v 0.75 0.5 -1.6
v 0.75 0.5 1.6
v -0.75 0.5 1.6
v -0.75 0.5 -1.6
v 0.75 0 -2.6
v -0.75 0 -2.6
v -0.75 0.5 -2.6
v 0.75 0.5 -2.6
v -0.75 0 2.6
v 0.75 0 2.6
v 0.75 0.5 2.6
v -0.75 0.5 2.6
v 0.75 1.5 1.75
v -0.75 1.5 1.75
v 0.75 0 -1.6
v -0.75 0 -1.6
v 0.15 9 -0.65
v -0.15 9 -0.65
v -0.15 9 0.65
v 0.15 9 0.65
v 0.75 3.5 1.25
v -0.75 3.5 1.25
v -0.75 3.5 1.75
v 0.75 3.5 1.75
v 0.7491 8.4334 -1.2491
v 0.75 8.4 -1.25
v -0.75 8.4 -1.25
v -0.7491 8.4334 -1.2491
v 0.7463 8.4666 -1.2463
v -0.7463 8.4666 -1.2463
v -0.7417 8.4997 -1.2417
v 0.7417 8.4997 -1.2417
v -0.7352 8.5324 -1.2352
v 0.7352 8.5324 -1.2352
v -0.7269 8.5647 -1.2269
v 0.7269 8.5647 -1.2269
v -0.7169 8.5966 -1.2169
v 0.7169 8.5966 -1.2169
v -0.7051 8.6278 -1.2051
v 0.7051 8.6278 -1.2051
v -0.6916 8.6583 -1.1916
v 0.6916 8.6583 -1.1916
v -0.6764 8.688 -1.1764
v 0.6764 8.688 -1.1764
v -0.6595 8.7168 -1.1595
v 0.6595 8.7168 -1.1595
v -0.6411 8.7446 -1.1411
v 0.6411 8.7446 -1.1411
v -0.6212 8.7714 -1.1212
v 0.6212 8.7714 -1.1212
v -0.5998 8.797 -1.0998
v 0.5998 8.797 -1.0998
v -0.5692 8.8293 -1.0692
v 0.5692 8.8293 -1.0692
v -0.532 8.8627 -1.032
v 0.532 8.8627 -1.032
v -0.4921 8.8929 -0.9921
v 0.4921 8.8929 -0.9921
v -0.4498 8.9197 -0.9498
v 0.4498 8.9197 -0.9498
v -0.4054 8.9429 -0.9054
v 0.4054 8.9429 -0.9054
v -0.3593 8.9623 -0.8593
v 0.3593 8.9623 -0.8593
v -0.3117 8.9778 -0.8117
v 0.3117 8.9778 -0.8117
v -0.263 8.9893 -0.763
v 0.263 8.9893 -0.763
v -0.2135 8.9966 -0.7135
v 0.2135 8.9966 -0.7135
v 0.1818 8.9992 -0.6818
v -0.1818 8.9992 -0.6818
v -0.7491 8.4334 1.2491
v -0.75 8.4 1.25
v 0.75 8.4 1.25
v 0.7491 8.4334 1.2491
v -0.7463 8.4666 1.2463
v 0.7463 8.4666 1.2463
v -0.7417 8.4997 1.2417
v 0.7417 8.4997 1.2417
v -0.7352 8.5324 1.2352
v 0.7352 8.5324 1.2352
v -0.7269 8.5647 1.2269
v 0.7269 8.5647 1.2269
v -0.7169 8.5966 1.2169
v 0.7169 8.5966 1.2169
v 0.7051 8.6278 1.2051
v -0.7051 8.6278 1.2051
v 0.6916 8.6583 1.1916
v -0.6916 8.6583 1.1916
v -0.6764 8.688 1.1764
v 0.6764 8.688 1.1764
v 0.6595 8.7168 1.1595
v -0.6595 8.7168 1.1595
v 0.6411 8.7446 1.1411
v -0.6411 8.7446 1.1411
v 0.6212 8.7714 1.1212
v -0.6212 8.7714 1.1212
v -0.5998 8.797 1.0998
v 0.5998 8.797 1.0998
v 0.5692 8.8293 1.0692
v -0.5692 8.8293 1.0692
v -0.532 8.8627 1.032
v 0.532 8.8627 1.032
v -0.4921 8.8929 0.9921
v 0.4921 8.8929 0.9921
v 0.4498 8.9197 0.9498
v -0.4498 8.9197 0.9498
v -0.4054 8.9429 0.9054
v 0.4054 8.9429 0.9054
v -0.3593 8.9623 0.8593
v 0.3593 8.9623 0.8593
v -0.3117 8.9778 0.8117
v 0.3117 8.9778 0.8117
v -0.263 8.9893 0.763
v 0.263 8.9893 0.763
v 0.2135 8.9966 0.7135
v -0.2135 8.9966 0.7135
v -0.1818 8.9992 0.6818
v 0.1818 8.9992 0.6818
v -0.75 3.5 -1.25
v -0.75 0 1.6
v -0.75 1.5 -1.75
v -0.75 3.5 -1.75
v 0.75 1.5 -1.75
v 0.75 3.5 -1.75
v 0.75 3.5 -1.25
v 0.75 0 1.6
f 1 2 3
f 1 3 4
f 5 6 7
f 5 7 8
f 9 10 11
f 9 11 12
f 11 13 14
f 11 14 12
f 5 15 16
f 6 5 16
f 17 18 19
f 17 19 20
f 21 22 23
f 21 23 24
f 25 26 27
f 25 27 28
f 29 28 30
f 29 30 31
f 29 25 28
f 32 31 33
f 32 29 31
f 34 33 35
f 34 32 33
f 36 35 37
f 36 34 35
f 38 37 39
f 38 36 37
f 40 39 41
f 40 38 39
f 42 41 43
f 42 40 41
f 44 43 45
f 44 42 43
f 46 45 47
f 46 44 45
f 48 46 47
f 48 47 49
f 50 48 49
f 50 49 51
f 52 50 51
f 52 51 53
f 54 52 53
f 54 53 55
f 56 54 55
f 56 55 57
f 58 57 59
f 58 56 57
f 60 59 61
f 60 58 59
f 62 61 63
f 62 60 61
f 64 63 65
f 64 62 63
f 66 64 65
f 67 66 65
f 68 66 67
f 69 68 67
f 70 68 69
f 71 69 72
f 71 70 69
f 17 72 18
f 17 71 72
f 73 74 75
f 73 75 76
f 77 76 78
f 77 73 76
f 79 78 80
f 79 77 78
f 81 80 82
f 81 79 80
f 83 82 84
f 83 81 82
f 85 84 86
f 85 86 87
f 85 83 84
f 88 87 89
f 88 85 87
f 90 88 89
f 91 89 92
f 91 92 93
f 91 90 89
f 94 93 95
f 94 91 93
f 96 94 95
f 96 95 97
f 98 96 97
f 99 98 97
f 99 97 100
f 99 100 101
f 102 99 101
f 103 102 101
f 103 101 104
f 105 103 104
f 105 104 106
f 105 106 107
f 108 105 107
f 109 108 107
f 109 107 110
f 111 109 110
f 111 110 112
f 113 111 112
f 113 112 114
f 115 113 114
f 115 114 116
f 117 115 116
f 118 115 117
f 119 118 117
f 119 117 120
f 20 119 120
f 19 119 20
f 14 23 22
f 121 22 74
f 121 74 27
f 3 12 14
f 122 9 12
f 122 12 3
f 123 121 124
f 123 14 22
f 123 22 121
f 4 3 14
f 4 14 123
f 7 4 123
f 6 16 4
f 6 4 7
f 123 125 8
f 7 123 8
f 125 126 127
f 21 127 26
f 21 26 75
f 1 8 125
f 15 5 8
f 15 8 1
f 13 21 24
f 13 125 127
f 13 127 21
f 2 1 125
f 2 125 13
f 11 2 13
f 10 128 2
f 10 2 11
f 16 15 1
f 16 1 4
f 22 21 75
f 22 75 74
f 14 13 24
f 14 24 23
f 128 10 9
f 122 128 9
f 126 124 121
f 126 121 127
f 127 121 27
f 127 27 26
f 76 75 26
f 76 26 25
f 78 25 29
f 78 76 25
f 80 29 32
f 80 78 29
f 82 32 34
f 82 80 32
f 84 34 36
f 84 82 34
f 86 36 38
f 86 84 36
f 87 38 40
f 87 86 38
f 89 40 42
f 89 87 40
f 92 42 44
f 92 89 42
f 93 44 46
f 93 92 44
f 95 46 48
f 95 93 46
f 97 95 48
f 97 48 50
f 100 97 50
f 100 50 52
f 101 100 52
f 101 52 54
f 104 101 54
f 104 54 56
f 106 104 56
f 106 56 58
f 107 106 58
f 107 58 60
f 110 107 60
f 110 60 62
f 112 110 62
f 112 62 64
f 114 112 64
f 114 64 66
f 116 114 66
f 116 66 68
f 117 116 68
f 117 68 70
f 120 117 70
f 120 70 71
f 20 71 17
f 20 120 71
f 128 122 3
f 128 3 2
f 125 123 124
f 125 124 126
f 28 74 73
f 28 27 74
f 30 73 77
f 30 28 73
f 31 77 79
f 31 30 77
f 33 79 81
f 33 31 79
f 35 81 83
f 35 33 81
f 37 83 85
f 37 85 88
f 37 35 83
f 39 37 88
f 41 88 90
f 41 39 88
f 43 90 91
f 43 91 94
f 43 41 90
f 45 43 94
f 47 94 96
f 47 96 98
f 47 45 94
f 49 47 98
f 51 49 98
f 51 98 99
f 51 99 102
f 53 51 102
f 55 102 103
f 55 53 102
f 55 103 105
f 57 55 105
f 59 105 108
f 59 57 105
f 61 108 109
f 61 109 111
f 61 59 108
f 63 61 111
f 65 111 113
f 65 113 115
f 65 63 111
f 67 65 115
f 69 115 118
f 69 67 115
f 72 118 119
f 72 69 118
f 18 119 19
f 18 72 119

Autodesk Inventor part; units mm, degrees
ref_plane "YZ Plane" through (0, 0, 0) normal (1, 0, 0) x (0, 1, 0)
ref_plane "XZ Plane" through (0, 0, 0) normal (0, 1, 0) x (-1, 0, 0)
ref_plane "XY Plane" through (0, 0, 0) normal (0, 0, 1) x (1, 0, 0)
sketch "Sketch1" plane through (0, 0, 0) normal (0, 1, 0) x (-1, 0, 0)
  line L0 (-0.75, -1.6) -> (0.75, -1.6)
  line L1 (0.75, -1.6) -> (0.75, 1.6)
  line L2 (0.75, 1.6) -> (-0.75, 1.6)
  line L3 (-0.75, 1.6) -> (-0.75, -1.6)
  line L4 (-0.75, -1.6) -> (0.75, 1.6) construction
  line L5 (0.75, -1.6) -> (-0.75, 1.6) construction
  line L6 (0.75, 1.6) -> (-0.75, 1.6)
  line L7 (-0.75, 1.6) -> (-0.75, 2.6)
  line L8 (-0.75, 2.6) -> (0.75, 2.6)
  line L9 (0.75, 2.6) -> (0.75, 1.6)
  line L10 (-0.75, -1.6) -> (0.75, -1.6)
  line L11 (0.75, -1.6) -> (0.75, -2.6)
  line L12 (0.75, -2.6) -> (-0.75, -2.6)
  line L13 (-0.75, -2.6) -> (-0.75, -1.6)
  point P0 (0, 0)
  point P1 (0.75, -1.6)
  dimension "d0" = 3.2
  dimension "d1" = 1.5
  dimension "d2" = 1
  dimension "d3" = 1
extrude "Extrusion1" add sketch "Sketch1" along normal blind 0.5 contours L0 L11 L12 L13 | L7 L8 L9 L2
sketch "Sketch2" plane through (0.75, 0, 2.6) normal (1, 0, 0) x (0, 0, -1)
  line L0 (0, 0.5) -> (1, 0.5) projected
  line L1 (0.85, 0.5) -> (4.35, 0.5)
  line L2 (4.35, 0.5) -> (4.35, 1.5)
  line L3 (4.35, 1.5) -> (0.85, 1.5)
  line L4 (0.85, 1.5) -> (0.85, 0.5)
  line L5 (0.85, 1.5) -> (0, 0.5)
  line L6 (5.2, 0) -> (5.2, 0.5) projected
  line L7 (4.35, 1.5) -> (5.2, 0.5)
  line L8 (0, 0) -> (1, 0) construction
  line L9 (0, 0) -> (5.2, 0) construction
  line L10 (2.6, 0) -> (2.6, 2.5684) construction
  line L11 (0, 0.5) -> (5.2, 0.5)
  point P0 (2.6, 0.5)
  dimension "d10" = 3.5
  dimension "d19" = 1
extrude "Extrusion3" add sketch "Sketch2" against normal blind 1.5
sketch "Sketch5" plane through (0.75, 1.5, 1.75) normal (0, 1, 0) x (1, 0, 0)
  line L0 (-1.5, 0) -> (-1.5, 3.5) projected
  line L1 (0, 3.5) -> (0, 0) projected
  line L2 (-1.5, 3.5) -> (0, 3.5)
  line L3 (0, 3.5) -> (0, 0)
  line L4 (0, 0) -> (-1.5, 0)
  line L5 (-1.5, 0) -> (-1.5, 3.5)
  point P0 (-0.75, 1.75)
  point P1 (0, 3.5)
  point P2 (-1.5, 0)
extrude "Extrusion5" add sketch "Sketch5" along normal blind 2
sketch "Sketch6" plane through (0.75, 3.5, 1.75) normal (0, 1, 0) x (1, 0, 0)
  line L0 (-1.5, 3) -> (0, 3)
  line L1 (0, 3) -> (0, 0.5)
  line L2 (0, 0.5) -> (-1.5, 0.5)
  line L3 (-1.5, 0.5) -> (-1.5, 3)
  line L4 (0, 0) -> (0, 3.5) construction
  line L5 (0, 0) -> (0, 0.5) construction
  line L6 (-0.75, 3) -> (-0.75, 3.5) construction
  line L7 (0, 3.5) -> (-1.5, 3.5) construction
  line L8 (-0.75, 0.5) -> (-0.75, 0) construction
  point P0 (-0.75, 1.75)
  point P1 (-1.5, 1.75)
  point P2 (0, 1.75)
  dimension "d20" = 2.5
extrude "Extrusion6" add sketch "Sketch6" along normal blind 5.5
fillet "Fillet1" radius 0.6 4 edges at (0, 9, -1.25) (-0.75, 9, 0) (0, 9, 1.25) (0.75, 9, 0)
sketch "Sketch7" plane through (0, 0, 0) normal (0, -1, 0) x (1, 0, 0)
  line L0 (-0.75, 2.6) -> (0.75, 2.6) projected
  line L1 (-0.75, -2.6) -> (0.75, -2.6)
  line L2 (0.75, -2.6) -> (0.75, 2.6)
  line L3 (0.75, 2.6) -> (-0.75, 2.6)
  line L4 (-0.75, 2.6) -> (-0.75, -2.6)
  line L5 (-0.75, -2.6) -> (0.75, 2.6) construction
  line L6 (0.75, -2.6) -> (-0.75, 2.6) construction
  point P0 (0, 0)
sketch "Sketch8" plane through (0.75, 0.5, -2.6) normal (0, -1, 0) x (1, 0, 0)
  line L0 (-1.5, 5.2) -> (0, 5.2) projected
  line L1 (0, 4.35) -> (-1.5, 4.35) projected
  line L2 (0, 5.2) -> (-1.5, 5.2)
  line L3 (-1.5, 5.2) -> (-1.5, 4.35)
  line L4 (-1.5, 4.35) -> (0, 4.35)
  line L5 (0, 4.35) -> (0, 5.2)
  line L6 (0, 0) -> (-1.5, 0) projected
  line L7 (0, 0.85) -> (-1.5, 0.85) projected
  line L8 (0, 0) -> (-1.5, 0)
  line L9 (-1.5, 0) -> (-1.5, 0.85)
  line L10 (-1.5, 0.85) -> (0, 0.85)
  line L11 (0, 0.85) -> (0, 0)
  point P0 (-0.75, 2.6)
  point P1 (0, 0.85)
sketch "Sketch4" plane through (0.75, 1.5, 1.75) normal (0, 1, 0) x (1, 0, 0)
  line L0 (-1.5, 3) -> (0, 3)
  line L1 (0, 3) -> (0, 0.5)
  line L2 (0, 0.5) -> (-1.5, 0.5)
  line L3 (-1.5, 0.5) -> (-1.5, 3)
  line L4 (-1.5, 0) -> (-1.5, 3.5) projected
  line L5 (0, 3.5) -> (0, 0) projected
  line L6 (0, 3.5) -> (-1.5, 3.5) projected
  point P0 (-0.75, 1.75)
  point P1 (-1.5, 1.75)
  point P2 (0, 1.75)
  point P3 (-0.75, 3)
  dimension "d13" = 2.5
  dimension "d14" = 0.5
properties part number "LightPipe"
